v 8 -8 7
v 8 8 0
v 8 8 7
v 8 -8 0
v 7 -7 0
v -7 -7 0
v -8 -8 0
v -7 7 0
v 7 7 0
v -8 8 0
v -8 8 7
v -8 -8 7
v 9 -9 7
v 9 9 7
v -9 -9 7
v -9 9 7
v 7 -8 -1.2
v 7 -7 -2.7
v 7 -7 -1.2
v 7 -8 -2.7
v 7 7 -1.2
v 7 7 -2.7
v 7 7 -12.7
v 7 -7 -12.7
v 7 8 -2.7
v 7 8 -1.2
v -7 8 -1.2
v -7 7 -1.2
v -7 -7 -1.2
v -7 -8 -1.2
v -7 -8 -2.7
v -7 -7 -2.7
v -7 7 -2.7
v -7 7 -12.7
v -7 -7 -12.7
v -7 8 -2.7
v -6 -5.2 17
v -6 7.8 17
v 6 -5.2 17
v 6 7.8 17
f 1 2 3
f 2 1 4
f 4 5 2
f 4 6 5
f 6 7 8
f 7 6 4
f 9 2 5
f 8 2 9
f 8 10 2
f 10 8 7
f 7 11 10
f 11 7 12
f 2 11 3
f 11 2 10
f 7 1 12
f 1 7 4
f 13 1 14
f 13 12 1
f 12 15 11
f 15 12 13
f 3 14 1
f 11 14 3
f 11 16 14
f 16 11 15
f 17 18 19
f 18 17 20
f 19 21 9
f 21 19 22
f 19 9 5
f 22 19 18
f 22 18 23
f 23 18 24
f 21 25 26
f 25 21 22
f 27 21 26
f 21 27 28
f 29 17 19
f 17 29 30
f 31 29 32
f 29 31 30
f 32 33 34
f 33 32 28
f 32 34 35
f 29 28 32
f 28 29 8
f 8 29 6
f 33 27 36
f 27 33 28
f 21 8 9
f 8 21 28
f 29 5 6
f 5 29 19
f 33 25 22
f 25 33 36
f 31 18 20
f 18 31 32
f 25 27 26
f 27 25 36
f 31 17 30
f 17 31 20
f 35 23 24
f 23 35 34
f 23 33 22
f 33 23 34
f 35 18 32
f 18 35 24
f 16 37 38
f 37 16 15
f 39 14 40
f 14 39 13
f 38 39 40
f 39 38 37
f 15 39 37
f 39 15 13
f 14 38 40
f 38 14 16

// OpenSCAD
key_switch(0, 0);

module key_switch(x, y) {
    union() {
        h1 = 2;
        translate([x, y, h1 / 2]) {
            cube([16, 16, h1], center=true);
        }
        h2 = 5;
        translate([x, y, h1 + h2 / 2]) {
            cube([16, 16, h2], center=true);
        }
        h3 = 1.2;
        translate([x, y, -h3 / 2]) {
            cube([14, 14, h3], center=true);
        }
        h4 = 1.5;
        translate([x, y, -h3 - h4 / 2]) {
            cube([14, 16, h4], center=true);
        }
        h5 = 10;
        translate([x, y, -h3 - h4 - h5 / 2]) {
            cube([14, 14, h5], center=true);
        }
        key_cap(x, y);
    }
}

module key_cap(x, y) {
    wx1 = 18;
    dx1 = wx1 / 2;

    wy1 = 18;
    dy1 = wy1 / 2;

    wx2 = 12;
    dx2 = wx2 / 2;

    wy2 = 13;
    ry2 = 0.6; // should be greater than 0.5

    z1 = 7;

    z2 = z1 + 10;

    points = [
    [x + dx1, y + dy1, z1], // 0
    [x + dx1, y - dy1, z1], // 1
    [x - dx1, y + dy1, z1], // 2
    [x - dx1, y - dy1, z1], // 3
    [x + dx2, y + ry2 * wy2, z2], // 4
    [x + dx2, y - (1 - ry2) * wy2, z2], // 5
    [x - dx2, y + ry2 * wy2, z2], // 6
    [x - dx2, y - (1 - ry2) * wy2, z2] // 7
    ];
    
    // "All faces must have points ordered in the same direction . OpenSCAD prefers clockwise when looking at each face from outside inwards (from OpenSCAD User Manual/Primitive Solids)"
    faces = [
        [0, 2, 3, 1], // bottom
        [0, 1, 5, 4], // right
        [1, 3, 7, 5], // front
        [3, 2, 6, 7], // left
        [2, 0, 4, 6], // back
        [4, 5, 7, 6]  // top
    ];
    
    polyhedron(points, faces);
}
